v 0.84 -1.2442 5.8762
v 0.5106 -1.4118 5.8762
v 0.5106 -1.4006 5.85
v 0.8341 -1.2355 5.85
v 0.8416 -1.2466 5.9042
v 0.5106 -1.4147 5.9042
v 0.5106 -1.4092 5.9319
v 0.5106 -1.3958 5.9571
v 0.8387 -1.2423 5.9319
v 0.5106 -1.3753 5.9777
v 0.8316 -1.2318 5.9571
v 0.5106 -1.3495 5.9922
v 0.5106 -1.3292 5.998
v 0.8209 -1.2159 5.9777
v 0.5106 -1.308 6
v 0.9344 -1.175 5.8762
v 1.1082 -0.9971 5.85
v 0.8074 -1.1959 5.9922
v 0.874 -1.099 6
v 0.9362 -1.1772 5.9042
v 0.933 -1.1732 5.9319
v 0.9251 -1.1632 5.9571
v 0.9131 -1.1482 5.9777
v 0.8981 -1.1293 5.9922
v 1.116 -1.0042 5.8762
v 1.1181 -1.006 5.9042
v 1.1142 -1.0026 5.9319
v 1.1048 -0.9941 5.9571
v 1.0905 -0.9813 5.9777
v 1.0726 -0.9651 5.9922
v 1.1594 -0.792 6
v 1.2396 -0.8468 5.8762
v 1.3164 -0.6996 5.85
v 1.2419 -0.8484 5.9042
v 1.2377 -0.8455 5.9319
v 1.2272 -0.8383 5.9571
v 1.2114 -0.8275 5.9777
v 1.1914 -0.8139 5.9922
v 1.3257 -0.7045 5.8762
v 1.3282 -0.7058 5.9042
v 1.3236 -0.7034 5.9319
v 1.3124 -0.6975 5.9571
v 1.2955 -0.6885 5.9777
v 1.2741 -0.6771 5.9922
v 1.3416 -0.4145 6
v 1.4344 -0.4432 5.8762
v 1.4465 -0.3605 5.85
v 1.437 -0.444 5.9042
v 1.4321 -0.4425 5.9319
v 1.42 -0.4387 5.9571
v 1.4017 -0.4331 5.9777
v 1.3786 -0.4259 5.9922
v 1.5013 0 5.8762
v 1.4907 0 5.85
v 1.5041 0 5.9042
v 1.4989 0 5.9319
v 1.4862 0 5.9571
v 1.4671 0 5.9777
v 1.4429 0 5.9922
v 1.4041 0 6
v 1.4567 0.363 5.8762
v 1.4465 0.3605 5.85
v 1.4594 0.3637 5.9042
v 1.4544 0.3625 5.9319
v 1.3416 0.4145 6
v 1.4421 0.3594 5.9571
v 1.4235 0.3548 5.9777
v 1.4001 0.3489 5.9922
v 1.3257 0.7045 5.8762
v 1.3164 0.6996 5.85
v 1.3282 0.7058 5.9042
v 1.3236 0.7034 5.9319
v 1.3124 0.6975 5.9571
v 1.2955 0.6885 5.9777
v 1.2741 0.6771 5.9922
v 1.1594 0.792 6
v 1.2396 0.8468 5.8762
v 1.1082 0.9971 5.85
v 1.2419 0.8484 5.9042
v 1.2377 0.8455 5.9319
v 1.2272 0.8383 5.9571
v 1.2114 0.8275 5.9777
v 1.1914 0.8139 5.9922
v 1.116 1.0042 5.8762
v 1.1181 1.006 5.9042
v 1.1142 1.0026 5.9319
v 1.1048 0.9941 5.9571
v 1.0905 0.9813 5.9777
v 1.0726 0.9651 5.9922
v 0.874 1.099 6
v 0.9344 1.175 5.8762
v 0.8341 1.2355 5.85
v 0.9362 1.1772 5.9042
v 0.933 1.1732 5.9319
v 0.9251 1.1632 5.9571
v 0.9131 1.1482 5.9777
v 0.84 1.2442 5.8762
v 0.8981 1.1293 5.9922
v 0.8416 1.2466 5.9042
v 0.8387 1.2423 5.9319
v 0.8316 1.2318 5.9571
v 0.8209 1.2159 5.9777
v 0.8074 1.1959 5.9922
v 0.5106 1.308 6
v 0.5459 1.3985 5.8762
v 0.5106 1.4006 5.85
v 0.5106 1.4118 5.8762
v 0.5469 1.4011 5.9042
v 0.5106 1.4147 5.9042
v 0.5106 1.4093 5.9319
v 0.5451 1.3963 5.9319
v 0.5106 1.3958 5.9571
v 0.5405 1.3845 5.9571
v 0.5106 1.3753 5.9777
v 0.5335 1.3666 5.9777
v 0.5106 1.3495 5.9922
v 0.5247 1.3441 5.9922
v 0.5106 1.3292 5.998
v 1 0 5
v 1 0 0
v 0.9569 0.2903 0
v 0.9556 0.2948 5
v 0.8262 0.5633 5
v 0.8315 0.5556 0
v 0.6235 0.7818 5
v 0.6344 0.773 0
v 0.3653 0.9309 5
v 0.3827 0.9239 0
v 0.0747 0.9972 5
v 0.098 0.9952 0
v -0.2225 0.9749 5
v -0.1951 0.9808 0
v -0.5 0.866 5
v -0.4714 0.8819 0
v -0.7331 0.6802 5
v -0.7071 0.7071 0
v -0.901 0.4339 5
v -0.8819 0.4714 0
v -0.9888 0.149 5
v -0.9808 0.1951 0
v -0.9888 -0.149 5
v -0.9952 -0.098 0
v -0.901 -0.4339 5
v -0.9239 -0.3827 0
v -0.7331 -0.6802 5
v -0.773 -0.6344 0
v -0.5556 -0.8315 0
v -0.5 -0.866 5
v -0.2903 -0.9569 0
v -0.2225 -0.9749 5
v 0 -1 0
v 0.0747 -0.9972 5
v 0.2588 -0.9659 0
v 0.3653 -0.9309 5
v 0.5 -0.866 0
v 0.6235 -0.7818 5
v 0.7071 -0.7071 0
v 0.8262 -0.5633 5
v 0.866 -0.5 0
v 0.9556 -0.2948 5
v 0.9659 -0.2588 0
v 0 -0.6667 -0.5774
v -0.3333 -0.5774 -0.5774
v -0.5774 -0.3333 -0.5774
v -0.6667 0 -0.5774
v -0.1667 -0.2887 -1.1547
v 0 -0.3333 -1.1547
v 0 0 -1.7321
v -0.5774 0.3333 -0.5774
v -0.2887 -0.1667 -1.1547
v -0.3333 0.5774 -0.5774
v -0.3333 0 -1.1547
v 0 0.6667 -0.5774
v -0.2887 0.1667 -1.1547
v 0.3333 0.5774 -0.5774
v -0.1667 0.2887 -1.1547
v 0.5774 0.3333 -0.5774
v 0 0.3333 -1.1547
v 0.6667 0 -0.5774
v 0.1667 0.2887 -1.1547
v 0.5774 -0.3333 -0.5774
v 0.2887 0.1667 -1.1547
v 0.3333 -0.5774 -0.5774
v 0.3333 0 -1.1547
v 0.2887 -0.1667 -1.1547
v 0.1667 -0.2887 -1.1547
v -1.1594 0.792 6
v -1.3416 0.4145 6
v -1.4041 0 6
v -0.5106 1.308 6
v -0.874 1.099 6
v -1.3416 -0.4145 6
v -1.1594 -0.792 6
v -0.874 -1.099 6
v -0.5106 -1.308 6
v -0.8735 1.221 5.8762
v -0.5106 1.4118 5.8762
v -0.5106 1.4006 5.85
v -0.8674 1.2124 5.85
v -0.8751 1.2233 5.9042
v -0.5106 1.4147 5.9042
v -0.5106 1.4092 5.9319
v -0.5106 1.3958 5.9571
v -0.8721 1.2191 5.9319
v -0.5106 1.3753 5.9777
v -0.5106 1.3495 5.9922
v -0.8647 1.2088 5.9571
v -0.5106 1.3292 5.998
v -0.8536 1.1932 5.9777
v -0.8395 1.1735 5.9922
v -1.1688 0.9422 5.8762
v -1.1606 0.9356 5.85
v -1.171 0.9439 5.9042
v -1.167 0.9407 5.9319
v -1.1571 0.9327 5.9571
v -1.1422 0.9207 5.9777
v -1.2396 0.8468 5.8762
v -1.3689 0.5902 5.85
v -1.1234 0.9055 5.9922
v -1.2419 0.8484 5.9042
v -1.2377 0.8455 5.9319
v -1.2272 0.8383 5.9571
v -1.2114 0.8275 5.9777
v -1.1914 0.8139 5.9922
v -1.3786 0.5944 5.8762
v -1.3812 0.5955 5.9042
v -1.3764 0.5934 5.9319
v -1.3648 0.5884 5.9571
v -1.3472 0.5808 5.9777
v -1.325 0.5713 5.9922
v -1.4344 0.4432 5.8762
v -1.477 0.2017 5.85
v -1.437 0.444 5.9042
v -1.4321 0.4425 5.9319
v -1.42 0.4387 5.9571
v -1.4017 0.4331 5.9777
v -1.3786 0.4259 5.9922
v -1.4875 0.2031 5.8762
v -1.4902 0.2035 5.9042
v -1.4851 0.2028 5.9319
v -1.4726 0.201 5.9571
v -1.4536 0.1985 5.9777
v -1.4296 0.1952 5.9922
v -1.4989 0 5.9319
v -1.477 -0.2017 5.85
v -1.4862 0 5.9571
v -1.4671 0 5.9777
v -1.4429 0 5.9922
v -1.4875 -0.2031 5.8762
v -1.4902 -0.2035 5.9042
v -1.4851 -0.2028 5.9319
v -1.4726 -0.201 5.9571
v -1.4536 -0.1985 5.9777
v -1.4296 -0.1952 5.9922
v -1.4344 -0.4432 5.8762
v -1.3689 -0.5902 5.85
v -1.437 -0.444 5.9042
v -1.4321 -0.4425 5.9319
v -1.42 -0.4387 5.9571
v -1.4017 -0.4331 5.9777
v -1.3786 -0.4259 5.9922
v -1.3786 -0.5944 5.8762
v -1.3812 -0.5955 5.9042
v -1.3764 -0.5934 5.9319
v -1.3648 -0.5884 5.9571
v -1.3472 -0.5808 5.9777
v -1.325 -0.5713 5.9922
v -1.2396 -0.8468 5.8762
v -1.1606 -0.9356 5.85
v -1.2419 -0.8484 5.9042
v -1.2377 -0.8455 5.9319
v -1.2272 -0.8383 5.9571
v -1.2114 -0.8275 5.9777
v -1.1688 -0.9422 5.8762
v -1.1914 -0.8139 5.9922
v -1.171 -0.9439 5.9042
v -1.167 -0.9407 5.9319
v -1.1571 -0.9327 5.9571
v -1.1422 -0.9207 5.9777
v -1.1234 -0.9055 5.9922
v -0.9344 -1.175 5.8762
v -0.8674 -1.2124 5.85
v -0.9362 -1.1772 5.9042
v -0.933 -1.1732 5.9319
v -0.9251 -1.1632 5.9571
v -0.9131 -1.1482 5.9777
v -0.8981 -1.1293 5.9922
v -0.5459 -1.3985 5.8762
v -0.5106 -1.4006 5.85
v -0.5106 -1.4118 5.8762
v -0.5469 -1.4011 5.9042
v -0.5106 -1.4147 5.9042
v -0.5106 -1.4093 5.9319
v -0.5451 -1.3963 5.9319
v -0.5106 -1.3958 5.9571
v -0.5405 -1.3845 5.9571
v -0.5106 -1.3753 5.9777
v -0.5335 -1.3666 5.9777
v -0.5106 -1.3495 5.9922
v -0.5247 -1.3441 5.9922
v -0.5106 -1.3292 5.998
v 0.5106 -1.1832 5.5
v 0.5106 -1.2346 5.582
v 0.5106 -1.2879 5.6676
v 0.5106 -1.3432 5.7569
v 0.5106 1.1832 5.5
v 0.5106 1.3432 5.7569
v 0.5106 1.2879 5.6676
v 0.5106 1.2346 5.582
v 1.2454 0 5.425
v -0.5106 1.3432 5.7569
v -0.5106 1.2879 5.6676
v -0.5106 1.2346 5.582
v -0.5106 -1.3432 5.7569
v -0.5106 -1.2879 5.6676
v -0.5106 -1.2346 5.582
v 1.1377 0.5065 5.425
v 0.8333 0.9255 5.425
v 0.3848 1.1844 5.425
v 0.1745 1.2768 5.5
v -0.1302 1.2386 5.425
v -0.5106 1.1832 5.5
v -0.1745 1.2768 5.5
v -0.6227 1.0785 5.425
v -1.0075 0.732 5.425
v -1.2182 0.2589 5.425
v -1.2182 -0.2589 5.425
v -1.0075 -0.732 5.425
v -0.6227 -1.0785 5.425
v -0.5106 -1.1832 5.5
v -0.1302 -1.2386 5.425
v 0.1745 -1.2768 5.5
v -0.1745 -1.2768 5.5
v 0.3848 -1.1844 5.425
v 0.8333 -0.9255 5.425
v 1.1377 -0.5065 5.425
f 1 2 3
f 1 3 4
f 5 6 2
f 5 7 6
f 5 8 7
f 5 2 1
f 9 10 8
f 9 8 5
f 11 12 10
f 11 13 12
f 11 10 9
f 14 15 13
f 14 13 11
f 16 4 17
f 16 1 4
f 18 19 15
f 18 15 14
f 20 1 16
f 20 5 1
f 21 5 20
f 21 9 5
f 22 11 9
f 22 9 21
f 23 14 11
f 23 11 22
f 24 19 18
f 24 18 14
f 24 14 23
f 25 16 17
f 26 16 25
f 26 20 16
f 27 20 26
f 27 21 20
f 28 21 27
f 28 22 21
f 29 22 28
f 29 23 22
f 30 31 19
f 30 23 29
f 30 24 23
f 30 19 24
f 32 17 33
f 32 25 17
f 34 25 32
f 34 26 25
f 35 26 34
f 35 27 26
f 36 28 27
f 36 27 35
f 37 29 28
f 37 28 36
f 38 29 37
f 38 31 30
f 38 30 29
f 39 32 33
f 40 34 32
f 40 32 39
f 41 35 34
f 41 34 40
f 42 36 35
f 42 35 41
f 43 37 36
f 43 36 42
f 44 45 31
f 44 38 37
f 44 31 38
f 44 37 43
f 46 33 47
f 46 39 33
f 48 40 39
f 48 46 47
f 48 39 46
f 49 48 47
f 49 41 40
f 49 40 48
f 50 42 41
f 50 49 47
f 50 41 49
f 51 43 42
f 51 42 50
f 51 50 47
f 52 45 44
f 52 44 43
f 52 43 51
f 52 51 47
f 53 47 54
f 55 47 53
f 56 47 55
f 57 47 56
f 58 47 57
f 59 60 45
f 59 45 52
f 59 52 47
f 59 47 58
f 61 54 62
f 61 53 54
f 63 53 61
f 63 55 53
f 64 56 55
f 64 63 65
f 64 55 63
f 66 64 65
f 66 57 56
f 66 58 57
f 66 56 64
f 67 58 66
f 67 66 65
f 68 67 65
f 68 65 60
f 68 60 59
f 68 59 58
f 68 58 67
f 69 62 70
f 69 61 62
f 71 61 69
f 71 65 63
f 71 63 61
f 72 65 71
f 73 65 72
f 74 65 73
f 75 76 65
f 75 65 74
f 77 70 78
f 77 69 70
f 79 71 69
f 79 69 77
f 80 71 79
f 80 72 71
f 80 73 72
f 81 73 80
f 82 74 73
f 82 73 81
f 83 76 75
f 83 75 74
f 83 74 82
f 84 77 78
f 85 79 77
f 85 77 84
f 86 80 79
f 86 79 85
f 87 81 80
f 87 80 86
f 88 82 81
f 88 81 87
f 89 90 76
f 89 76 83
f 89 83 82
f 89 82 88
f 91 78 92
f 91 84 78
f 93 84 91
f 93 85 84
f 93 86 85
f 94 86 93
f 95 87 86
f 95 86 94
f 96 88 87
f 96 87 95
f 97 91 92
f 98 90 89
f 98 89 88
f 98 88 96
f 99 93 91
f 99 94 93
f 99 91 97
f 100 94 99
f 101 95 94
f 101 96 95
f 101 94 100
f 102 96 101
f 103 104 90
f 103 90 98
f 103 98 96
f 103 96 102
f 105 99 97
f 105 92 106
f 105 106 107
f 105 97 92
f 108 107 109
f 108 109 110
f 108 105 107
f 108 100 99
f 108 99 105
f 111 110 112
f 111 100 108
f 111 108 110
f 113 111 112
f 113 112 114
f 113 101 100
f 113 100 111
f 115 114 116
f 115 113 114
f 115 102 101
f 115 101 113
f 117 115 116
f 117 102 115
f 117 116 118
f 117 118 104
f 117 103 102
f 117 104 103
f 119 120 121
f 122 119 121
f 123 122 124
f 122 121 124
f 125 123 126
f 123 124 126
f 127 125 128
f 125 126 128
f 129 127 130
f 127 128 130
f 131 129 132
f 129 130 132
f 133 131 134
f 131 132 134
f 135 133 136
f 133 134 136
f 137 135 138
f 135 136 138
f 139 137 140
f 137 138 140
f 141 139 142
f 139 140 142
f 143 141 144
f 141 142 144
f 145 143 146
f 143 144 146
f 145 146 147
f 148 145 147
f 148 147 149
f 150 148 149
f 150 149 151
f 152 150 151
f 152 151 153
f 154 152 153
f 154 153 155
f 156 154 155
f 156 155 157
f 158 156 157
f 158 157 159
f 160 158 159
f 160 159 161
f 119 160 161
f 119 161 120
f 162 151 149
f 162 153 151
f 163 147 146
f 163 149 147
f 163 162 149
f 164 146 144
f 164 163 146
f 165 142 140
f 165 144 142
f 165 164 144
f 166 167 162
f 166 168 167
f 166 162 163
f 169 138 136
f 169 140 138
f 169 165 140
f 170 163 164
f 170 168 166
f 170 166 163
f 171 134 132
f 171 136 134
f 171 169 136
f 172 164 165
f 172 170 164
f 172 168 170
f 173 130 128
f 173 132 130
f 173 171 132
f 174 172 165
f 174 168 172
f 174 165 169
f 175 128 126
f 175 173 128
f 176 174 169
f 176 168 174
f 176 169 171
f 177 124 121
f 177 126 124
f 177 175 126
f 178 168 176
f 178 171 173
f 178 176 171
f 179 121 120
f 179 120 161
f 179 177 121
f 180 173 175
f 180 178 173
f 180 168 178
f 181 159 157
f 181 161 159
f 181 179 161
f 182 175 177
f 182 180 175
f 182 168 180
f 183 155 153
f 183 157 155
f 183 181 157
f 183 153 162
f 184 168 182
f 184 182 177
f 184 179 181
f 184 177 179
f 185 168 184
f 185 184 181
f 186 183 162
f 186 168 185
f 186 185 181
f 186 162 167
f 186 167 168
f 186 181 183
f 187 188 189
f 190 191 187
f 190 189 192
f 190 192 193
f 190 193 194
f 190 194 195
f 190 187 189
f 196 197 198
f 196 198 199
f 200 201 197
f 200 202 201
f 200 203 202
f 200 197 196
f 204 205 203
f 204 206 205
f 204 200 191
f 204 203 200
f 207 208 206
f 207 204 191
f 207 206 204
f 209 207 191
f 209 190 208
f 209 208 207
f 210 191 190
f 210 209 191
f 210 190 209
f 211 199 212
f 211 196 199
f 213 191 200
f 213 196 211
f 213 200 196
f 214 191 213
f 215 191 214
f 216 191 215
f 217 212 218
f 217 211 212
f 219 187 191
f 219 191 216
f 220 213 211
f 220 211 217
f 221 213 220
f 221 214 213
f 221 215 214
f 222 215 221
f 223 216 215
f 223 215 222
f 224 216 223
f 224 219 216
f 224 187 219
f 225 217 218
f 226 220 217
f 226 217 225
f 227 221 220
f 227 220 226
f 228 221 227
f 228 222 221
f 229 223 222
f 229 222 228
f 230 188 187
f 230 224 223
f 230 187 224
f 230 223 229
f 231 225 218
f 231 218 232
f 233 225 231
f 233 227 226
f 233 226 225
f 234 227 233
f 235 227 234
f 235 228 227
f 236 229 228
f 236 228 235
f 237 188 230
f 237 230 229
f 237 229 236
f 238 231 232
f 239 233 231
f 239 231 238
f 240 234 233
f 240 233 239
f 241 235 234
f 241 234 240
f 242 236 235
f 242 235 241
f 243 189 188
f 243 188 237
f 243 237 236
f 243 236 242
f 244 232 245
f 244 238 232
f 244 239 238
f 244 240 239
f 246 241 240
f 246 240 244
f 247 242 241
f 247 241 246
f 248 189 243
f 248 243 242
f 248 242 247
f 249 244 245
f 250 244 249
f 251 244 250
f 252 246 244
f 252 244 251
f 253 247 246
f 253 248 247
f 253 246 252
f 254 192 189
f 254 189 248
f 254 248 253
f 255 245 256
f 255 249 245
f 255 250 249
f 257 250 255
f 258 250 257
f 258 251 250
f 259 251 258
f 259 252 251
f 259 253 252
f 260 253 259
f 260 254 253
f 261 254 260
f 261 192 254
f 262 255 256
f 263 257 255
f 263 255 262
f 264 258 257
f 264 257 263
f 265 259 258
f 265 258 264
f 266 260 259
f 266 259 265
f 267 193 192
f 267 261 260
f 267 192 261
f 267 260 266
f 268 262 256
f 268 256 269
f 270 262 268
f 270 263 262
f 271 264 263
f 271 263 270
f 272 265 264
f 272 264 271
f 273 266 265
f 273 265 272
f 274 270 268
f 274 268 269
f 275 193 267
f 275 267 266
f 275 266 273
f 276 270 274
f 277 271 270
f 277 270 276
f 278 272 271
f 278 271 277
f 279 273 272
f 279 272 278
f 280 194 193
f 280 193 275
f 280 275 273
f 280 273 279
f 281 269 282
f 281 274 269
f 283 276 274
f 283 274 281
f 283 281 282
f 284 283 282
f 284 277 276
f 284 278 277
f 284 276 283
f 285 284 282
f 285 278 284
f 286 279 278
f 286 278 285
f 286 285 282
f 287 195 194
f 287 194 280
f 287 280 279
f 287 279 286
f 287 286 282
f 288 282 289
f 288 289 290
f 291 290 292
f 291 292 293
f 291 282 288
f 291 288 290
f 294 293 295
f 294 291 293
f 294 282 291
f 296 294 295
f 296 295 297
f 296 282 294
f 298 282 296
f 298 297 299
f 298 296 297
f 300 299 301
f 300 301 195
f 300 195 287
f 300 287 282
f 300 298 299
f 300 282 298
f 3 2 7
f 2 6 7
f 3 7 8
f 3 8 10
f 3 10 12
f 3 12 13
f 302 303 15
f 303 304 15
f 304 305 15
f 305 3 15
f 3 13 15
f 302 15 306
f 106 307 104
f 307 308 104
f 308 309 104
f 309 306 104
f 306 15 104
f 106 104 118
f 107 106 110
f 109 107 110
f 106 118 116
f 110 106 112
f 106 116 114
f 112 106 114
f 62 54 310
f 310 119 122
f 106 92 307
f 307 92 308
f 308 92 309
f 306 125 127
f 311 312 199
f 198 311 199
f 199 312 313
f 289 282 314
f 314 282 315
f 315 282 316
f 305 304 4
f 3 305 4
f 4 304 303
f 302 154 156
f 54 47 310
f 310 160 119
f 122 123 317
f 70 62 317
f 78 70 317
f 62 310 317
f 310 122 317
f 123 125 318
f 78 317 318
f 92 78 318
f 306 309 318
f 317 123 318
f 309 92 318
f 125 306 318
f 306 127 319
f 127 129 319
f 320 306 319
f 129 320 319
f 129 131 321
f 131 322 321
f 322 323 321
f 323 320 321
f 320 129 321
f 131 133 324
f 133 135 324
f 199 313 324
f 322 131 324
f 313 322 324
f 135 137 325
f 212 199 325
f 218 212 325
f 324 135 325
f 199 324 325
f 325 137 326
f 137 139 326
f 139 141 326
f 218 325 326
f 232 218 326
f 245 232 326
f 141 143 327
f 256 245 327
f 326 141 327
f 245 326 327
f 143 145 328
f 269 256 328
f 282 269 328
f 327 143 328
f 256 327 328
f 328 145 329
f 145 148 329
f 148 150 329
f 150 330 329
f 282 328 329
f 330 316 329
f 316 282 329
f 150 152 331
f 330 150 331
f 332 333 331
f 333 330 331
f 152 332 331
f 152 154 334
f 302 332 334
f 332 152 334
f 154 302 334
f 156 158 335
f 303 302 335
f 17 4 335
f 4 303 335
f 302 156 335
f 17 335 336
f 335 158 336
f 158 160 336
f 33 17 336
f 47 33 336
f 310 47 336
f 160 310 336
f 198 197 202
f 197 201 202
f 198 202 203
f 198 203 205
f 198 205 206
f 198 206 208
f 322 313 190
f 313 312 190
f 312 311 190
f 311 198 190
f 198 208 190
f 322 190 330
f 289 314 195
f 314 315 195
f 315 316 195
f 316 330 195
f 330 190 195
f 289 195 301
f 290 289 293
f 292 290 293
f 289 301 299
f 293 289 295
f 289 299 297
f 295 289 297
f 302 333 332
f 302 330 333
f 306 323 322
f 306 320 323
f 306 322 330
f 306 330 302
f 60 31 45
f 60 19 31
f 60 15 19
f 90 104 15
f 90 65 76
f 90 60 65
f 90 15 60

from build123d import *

# Parameters (mm, degrees)
SKETCH1_R           = 1
BOSS_EXTRUDE1_DEPTH = 5
SKETCH2_R           = 1
BOSS_EXTRUDE3_DEPTH = 1
BOSS_EXTRUDE3_DRAFT = -30
CUT_EXTRUDE1_DEPTH  = 0.5
FILLET2_R           = 0.1


with BuildPart() as part:
    # Sketch1 → Boss-Extrude1 (new body)
    with BuildSketch(Plane.XY):
        Circle(SKETCH1_R)
    extrude(amount=BOSS_EXTRUDE1_DEPTH)

    # Boss-Extrude2 cone 1 section (through the dimple's axis) → Boss-Extrude2 (revolve)
    with BuildSketch(Plane(origin=(0, 0, 0), x_dir=(0, -1, 0), z_dir=(1, 0, 0))):
        Polygon((0, 0), (1, 0), (0, 1.732050808), align=None)
    revolve(axis=Axis((0, 0, 0), (0, 0, -1)))


with BuildPart() as boss_extrude3_tool:
    # Sketch2 → Boss-Extrude3 (with draft: the straight prism first)
    with BuildSketch(Plane.XY.offset(5)):
        Circle(SKETCH2_R)
    extrude(amount=BOSS_EXTRUDE3_DEPTH)
    # Boss-Extrude3: the draft: its side faces are tilted about the plane it starts from
    boss_extrude3_sides = [boss_extrude3_tool.faces().sort_by_distance(p)[0] for p in [
        (-1, 0, 5.5),
    ]]
    draft(boss_extrude3_sides, Plane.XY.offset(5), BOSS_EXTRUDE3_DRAFT)


with BuildPart() as part_1:
    add(part.part)

    # Boss-Extrude3: add boss_extrude3_tool
    add(boss_extrude3_tool.part)

    # Sketch3 → Cut-Extrude1 (cut)
    with BuildSketch(Plane.XY.offset(6)):
        with BuildLine():
            Line((-0.510620476, 1.492414353), (-0.510620476, -1.492414353))
            ThreePointArc((-0.510620476, -1.492414353), (0, -1.577350269), (0.510620476, -1.492414353))
            Line((0.510620476, -1.492414353), (0.510620476, 1.492414353))
            ThreePointArc((0.510620476, 1.492414353), (0, 1.577350269), (-0.510620476, 1.492414353))
        make_face()
    extrude(amount=-CUT_EXTRUDE1_DEPTH, mode=Mode.SUBTRACT)

    # Fillet2
    fillet2_edges = [part_1.edges().sort_by_distance(p)[0] for p in [
        (-1.577350269, 0, 6),
        (1.283250018, 0.917225852, 6),
    ]]
    fillet(fillet2_edges, radius=FILLET2_R)


solid = part_1.part
